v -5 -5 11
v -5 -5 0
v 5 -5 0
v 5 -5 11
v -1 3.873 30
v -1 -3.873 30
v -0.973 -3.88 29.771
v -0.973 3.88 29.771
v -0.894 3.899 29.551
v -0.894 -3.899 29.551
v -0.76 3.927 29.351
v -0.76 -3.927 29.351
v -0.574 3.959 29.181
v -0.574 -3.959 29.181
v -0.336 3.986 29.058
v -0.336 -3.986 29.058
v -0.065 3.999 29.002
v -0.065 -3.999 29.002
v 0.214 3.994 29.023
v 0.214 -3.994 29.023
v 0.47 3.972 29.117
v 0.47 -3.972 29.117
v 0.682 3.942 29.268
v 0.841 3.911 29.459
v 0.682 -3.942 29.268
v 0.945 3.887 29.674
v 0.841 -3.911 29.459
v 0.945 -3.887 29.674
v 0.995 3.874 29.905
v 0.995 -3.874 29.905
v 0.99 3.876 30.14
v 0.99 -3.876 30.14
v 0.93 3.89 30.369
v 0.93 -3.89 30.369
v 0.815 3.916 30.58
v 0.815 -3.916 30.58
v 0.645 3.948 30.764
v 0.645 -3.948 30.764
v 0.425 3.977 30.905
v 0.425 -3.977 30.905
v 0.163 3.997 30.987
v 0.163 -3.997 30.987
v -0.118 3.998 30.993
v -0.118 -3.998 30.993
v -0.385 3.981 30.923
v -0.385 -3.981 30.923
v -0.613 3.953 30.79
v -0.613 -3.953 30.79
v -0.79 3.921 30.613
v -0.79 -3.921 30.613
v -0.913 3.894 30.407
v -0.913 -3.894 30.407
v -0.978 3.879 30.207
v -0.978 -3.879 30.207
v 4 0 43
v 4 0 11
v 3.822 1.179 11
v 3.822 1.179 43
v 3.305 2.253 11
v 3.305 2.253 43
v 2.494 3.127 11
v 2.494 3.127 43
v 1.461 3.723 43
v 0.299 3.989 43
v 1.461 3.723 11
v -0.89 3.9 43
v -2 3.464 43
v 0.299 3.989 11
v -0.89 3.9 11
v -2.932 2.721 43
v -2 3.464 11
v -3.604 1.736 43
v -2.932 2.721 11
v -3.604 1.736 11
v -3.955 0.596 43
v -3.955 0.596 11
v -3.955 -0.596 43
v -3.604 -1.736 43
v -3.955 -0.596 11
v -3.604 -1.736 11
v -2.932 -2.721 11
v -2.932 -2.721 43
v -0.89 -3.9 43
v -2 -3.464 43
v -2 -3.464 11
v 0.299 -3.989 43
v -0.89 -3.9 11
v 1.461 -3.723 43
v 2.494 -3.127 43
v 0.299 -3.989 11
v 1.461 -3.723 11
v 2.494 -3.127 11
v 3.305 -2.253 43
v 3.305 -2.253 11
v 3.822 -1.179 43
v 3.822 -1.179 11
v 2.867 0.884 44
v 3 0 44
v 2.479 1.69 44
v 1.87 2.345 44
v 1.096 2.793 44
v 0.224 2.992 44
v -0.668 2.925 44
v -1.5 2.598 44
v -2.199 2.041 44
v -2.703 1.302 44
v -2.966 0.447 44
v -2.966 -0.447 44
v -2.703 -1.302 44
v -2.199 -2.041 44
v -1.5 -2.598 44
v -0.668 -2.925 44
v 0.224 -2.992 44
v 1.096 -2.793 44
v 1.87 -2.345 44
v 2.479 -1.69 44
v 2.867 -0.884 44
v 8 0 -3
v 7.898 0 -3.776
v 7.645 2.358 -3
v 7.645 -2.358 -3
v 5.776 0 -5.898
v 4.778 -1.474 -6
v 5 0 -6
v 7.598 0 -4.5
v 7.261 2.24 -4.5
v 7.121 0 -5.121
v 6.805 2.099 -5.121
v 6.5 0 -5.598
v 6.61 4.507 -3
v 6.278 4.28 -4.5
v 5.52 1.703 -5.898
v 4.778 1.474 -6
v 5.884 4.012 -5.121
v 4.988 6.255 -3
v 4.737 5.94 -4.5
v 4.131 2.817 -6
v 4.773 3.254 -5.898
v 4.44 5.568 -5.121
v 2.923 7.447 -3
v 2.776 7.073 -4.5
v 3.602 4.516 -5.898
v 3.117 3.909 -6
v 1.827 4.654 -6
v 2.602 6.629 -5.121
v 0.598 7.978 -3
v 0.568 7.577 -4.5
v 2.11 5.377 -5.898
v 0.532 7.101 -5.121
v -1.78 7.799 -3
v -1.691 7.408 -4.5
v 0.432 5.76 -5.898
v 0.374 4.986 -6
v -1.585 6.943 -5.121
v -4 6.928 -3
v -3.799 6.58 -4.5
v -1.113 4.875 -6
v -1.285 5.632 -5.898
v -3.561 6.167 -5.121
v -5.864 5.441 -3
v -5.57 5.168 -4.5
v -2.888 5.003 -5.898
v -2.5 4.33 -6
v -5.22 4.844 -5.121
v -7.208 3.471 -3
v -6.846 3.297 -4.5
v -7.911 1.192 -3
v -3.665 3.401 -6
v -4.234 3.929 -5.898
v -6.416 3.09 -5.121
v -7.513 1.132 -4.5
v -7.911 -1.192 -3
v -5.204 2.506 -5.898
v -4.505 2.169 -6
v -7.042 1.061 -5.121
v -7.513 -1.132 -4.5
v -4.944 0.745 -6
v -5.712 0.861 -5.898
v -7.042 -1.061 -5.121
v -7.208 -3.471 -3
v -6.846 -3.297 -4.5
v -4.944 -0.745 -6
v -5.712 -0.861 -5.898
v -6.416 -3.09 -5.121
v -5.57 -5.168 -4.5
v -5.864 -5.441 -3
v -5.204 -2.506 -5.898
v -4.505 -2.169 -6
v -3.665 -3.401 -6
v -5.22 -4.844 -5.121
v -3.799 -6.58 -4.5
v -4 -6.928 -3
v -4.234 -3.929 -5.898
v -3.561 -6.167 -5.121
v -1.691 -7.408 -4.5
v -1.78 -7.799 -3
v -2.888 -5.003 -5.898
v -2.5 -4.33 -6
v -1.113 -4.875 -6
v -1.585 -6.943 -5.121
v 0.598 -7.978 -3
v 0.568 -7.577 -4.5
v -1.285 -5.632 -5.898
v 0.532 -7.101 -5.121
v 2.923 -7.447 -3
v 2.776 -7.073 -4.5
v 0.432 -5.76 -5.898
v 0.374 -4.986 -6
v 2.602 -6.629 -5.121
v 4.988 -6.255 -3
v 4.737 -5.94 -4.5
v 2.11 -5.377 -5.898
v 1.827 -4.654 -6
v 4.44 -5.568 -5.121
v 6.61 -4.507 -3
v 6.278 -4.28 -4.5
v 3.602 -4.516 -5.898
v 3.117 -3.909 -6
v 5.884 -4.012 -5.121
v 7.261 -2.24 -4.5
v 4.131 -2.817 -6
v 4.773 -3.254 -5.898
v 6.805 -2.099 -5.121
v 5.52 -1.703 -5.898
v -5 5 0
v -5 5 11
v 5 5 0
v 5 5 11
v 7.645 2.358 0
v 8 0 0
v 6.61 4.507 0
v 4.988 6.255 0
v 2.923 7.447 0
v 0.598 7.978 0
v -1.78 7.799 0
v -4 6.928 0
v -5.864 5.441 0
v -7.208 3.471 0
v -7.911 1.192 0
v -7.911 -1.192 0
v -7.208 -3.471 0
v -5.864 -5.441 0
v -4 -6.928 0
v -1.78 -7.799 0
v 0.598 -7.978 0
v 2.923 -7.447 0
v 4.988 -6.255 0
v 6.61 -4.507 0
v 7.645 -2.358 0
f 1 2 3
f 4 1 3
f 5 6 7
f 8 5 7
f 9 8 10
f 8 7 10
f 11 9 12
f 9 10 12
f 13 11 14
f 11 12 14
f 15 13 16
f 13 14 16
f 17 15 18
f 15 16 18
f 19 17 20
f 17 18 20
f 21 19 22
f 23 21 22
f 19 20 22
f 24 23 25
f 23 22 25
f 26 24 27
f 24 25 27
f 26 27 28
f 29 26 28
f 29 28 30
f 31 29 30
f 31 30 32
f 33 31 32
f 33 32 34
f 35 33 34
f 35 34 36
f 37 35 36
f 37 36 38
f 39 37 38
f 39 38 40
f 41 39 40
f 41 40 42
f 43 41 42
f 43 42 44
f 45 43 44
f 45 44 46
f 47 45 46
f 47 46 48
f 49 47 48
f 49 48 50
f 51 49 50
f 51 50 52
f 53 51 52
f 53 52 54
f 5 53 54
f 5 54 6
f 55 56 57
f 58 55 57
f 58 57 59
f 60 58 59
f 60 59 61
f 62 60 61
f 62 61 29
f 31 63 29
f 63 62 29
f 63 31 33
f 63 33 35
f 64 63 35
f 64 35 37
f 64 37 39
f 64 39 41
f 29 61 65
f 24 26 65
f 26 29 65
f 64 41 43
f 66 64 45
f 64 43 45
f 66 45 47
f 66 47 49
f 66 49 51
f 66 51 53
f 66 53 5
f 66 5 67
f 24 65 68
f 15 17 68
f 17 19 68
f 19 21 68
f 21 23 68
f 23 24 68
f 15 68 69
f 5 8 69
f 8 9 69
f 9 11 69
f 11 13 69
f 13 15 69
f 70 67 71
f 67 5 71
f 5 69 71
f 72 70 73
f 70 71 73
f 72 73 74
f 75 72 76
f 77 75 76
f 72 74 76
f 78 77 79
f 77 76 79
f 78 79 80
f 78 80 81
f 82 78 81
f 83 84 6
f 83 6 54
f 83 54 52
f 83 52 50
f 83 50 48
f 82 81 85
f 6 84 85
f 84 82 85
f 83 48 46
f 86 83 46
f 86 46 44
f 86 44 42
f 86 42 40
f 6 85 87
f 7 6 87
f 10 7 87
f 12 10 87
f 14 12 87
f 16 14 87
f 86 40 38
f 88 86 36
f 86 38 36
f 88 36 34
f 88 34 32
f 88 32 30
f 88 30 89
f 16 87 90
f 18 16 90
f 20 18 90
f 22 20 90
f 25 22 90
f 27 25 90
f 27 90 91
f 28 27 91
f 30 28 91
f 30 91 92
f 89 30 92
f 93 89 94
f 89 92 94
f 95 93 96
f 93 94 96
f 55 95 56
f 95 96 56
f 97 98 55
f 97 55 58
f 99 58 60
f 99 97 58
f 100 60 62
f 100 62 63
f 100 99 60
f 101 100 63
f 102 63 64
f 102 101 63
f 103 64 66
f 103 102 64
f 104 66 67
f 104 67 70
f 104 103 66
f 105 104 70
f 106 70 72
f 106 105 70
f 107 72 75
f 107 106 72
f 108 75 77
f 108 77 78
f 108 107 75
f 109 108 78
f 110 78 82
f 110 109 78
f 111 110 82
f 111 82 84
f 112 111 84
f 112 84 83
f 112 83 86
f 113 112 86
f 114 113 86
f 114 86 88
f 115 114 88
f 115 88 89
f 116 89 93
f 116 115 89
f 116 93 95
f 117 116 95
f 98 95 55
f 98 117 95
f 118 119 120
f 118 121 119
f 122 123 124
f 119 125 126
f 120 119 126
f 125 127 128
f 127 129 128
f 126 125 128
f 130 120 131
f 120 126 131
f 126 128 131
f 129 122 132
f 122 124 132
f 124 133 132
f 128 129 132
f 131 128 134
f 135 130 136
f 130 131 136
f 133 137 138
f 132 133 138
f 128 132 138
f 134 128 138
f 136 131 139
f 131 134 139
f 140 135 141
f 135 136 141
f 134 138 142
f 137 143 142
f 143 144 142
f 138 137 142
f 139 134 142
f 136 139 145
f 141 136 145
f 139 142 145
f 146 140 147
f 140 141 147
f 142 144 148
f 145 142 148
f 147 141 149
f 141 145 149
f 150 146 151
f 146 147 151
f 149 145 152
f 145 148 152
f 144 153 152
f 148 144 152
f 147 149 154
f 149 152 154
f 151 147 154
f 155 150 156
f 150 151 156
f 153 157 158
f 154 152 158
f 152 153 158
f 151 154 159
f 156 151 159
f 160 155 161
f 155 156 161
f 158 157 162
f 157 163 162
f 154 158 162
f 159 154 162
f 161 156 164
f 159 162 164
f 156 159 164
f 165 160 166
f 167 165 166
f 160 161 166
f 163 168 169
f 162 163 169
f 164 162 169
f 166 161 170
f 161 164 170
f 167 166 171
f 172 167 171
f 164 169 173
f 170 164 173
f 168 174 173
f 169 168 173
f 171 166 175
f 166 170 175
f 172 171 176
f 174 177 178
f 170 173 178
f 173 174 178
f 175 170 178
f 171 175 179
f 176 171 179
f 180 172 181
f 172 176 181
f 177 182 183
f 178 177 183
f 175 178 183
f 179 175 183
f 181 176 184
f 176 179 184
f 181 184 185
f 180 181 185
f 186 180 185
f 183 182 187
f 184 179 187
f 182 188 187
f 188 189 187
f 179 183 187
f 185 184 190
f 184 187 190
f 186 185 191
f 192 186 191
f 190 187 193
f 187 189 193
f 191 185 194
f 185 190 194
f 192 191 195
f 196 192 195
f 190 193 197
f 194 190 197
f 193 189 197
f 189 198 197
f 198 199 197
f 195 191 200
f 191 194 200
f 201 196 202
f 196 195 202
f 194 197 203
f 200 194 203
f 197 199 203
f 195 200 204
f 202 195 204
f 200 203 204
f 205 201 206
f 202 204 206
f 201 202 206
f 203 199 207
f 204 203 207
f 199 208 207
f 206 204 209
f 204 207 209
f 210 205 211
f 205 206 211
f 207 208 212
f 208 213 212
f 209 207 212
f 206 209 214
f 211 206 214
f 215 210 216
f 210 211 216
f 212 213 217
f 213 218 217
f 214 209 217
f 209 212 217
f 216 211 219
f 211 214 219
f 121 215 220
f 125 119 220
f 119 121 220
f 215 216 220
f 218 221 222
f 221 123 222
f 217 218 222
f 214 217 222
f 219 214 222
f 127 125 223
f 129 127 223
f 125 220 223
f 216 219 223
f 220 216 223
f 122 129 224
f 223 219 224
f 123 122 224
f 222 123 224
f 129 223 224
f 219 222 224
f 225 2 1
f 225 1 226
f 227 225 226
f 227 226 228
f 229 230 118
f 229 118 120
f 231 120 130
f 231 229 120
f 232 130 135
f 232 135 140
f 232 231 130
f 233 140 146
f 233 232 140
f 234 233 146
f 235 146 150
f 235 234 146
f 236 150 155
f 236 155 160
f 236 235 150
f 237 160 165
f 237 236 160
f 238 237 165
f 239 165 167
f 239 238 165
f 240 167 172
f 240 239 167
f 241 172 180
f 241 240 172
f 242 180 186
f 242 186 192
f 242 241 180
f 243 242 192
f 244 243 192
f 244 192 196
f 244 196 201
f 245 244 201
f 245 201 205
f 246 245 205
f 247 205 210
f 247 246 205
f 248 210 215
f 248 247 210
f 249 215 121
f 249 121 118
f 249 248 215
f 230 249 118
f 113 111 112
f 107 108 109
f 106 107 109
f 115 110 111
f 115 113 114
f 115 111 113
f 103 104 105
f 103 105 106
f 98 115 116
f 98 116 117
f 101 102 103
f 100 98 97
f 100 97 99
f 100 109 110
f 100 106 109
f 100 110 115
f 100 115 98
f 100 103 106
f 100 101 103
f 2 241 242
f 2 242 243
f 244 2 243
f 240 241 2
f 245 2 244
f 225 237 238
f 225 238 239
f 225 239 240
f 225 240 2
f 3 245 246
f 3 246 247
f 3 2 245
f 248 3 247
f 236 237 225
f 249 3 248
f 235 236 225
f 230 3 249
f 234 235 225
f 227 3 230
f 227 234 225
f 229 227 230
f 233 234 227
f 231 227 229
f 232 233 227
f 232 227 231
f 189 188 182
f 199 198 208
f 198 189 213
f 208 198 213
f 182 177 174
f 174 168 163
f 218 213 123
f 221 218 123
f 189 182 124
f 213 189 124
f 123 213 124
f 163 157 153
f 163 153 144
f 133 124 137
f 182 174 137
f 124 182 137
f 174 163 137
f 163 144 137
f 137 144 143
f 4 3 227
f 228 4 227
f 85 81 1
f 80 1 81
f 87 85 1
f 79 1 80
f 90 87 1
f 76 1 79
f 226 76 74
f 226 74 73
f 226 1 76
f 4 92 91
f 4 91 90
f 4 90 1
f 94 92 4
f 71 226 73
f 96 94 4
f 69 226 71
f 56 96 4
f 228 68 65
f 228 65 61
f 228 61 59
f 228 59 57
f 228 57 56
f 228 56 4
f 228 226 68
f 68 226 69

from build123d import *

# Parameters (mm, degrees)
SKETCH1_R                = 8
BOSS_EXTRUDE1_DEPTH      = 6
SKETCH2_W                = 10
SKETCH2_H                = 10
BOSS_EXTRUDE2_DEPTH      = 11
SKETCH4_R                = 4
BOSS_EXTRUDE3_DEPTH      = 44
F_2_0_2_DIAMETER_HOLE1_D = 2
FILLET1_R                = 3
CHAMFER1_SIZE            = 1


with BuildPart() as part:
    # Sketch1 → Boss-Extrude1 (new body)
    with BuildSketch(Plane.XY):
        Circle(SKETCH1_R)
    extrude(amount=-BOSS_EXTRUDE1_DEPTH)

    # Sketch2 → Boss-Extrude2 (add)
    with BuildSketch(Plane.XY):
        Rectangle(SKETCH2_W, SKETCH2_H)
    extrude(amount=BOSS_EXTRUDE2_DEPTH)

    # Sketch4 → Boss-Extrude3 (add)
    with BuildSketch(Plane.XY):
        Circle(SKETCH4_R)
    extrude(amount=BOSS_EXTRUDE3_DEPTH)

    # Ø2.0 (2) Diameter Hole1 (through all)
    with Locations(Plane(origin=(0, 4, 30), x_dir=(1, 0, 0), z_dir=(0, 1, 0))):
        with Locations((0, 0)):
            Hole(F_2_0_2_DIAMETER_HOLE1_D / 2)

    # Fillet1
    fillet1_edges = [part.edges().sort_by_distance(p)[0] for p in [
        (-8, 0, -6),
    ]]
    fillet(fillet1_edges, radius=FILLET1_R)

    # Chamfer1
    chamfer1_edges = [part.edges().sort_by_distance(p)[0] for p in [
        (-4, 0, 44),
    ]]
    chamfer(chamfer1_edges, length=CHAMFER1_SIZE)


solid = part.part
